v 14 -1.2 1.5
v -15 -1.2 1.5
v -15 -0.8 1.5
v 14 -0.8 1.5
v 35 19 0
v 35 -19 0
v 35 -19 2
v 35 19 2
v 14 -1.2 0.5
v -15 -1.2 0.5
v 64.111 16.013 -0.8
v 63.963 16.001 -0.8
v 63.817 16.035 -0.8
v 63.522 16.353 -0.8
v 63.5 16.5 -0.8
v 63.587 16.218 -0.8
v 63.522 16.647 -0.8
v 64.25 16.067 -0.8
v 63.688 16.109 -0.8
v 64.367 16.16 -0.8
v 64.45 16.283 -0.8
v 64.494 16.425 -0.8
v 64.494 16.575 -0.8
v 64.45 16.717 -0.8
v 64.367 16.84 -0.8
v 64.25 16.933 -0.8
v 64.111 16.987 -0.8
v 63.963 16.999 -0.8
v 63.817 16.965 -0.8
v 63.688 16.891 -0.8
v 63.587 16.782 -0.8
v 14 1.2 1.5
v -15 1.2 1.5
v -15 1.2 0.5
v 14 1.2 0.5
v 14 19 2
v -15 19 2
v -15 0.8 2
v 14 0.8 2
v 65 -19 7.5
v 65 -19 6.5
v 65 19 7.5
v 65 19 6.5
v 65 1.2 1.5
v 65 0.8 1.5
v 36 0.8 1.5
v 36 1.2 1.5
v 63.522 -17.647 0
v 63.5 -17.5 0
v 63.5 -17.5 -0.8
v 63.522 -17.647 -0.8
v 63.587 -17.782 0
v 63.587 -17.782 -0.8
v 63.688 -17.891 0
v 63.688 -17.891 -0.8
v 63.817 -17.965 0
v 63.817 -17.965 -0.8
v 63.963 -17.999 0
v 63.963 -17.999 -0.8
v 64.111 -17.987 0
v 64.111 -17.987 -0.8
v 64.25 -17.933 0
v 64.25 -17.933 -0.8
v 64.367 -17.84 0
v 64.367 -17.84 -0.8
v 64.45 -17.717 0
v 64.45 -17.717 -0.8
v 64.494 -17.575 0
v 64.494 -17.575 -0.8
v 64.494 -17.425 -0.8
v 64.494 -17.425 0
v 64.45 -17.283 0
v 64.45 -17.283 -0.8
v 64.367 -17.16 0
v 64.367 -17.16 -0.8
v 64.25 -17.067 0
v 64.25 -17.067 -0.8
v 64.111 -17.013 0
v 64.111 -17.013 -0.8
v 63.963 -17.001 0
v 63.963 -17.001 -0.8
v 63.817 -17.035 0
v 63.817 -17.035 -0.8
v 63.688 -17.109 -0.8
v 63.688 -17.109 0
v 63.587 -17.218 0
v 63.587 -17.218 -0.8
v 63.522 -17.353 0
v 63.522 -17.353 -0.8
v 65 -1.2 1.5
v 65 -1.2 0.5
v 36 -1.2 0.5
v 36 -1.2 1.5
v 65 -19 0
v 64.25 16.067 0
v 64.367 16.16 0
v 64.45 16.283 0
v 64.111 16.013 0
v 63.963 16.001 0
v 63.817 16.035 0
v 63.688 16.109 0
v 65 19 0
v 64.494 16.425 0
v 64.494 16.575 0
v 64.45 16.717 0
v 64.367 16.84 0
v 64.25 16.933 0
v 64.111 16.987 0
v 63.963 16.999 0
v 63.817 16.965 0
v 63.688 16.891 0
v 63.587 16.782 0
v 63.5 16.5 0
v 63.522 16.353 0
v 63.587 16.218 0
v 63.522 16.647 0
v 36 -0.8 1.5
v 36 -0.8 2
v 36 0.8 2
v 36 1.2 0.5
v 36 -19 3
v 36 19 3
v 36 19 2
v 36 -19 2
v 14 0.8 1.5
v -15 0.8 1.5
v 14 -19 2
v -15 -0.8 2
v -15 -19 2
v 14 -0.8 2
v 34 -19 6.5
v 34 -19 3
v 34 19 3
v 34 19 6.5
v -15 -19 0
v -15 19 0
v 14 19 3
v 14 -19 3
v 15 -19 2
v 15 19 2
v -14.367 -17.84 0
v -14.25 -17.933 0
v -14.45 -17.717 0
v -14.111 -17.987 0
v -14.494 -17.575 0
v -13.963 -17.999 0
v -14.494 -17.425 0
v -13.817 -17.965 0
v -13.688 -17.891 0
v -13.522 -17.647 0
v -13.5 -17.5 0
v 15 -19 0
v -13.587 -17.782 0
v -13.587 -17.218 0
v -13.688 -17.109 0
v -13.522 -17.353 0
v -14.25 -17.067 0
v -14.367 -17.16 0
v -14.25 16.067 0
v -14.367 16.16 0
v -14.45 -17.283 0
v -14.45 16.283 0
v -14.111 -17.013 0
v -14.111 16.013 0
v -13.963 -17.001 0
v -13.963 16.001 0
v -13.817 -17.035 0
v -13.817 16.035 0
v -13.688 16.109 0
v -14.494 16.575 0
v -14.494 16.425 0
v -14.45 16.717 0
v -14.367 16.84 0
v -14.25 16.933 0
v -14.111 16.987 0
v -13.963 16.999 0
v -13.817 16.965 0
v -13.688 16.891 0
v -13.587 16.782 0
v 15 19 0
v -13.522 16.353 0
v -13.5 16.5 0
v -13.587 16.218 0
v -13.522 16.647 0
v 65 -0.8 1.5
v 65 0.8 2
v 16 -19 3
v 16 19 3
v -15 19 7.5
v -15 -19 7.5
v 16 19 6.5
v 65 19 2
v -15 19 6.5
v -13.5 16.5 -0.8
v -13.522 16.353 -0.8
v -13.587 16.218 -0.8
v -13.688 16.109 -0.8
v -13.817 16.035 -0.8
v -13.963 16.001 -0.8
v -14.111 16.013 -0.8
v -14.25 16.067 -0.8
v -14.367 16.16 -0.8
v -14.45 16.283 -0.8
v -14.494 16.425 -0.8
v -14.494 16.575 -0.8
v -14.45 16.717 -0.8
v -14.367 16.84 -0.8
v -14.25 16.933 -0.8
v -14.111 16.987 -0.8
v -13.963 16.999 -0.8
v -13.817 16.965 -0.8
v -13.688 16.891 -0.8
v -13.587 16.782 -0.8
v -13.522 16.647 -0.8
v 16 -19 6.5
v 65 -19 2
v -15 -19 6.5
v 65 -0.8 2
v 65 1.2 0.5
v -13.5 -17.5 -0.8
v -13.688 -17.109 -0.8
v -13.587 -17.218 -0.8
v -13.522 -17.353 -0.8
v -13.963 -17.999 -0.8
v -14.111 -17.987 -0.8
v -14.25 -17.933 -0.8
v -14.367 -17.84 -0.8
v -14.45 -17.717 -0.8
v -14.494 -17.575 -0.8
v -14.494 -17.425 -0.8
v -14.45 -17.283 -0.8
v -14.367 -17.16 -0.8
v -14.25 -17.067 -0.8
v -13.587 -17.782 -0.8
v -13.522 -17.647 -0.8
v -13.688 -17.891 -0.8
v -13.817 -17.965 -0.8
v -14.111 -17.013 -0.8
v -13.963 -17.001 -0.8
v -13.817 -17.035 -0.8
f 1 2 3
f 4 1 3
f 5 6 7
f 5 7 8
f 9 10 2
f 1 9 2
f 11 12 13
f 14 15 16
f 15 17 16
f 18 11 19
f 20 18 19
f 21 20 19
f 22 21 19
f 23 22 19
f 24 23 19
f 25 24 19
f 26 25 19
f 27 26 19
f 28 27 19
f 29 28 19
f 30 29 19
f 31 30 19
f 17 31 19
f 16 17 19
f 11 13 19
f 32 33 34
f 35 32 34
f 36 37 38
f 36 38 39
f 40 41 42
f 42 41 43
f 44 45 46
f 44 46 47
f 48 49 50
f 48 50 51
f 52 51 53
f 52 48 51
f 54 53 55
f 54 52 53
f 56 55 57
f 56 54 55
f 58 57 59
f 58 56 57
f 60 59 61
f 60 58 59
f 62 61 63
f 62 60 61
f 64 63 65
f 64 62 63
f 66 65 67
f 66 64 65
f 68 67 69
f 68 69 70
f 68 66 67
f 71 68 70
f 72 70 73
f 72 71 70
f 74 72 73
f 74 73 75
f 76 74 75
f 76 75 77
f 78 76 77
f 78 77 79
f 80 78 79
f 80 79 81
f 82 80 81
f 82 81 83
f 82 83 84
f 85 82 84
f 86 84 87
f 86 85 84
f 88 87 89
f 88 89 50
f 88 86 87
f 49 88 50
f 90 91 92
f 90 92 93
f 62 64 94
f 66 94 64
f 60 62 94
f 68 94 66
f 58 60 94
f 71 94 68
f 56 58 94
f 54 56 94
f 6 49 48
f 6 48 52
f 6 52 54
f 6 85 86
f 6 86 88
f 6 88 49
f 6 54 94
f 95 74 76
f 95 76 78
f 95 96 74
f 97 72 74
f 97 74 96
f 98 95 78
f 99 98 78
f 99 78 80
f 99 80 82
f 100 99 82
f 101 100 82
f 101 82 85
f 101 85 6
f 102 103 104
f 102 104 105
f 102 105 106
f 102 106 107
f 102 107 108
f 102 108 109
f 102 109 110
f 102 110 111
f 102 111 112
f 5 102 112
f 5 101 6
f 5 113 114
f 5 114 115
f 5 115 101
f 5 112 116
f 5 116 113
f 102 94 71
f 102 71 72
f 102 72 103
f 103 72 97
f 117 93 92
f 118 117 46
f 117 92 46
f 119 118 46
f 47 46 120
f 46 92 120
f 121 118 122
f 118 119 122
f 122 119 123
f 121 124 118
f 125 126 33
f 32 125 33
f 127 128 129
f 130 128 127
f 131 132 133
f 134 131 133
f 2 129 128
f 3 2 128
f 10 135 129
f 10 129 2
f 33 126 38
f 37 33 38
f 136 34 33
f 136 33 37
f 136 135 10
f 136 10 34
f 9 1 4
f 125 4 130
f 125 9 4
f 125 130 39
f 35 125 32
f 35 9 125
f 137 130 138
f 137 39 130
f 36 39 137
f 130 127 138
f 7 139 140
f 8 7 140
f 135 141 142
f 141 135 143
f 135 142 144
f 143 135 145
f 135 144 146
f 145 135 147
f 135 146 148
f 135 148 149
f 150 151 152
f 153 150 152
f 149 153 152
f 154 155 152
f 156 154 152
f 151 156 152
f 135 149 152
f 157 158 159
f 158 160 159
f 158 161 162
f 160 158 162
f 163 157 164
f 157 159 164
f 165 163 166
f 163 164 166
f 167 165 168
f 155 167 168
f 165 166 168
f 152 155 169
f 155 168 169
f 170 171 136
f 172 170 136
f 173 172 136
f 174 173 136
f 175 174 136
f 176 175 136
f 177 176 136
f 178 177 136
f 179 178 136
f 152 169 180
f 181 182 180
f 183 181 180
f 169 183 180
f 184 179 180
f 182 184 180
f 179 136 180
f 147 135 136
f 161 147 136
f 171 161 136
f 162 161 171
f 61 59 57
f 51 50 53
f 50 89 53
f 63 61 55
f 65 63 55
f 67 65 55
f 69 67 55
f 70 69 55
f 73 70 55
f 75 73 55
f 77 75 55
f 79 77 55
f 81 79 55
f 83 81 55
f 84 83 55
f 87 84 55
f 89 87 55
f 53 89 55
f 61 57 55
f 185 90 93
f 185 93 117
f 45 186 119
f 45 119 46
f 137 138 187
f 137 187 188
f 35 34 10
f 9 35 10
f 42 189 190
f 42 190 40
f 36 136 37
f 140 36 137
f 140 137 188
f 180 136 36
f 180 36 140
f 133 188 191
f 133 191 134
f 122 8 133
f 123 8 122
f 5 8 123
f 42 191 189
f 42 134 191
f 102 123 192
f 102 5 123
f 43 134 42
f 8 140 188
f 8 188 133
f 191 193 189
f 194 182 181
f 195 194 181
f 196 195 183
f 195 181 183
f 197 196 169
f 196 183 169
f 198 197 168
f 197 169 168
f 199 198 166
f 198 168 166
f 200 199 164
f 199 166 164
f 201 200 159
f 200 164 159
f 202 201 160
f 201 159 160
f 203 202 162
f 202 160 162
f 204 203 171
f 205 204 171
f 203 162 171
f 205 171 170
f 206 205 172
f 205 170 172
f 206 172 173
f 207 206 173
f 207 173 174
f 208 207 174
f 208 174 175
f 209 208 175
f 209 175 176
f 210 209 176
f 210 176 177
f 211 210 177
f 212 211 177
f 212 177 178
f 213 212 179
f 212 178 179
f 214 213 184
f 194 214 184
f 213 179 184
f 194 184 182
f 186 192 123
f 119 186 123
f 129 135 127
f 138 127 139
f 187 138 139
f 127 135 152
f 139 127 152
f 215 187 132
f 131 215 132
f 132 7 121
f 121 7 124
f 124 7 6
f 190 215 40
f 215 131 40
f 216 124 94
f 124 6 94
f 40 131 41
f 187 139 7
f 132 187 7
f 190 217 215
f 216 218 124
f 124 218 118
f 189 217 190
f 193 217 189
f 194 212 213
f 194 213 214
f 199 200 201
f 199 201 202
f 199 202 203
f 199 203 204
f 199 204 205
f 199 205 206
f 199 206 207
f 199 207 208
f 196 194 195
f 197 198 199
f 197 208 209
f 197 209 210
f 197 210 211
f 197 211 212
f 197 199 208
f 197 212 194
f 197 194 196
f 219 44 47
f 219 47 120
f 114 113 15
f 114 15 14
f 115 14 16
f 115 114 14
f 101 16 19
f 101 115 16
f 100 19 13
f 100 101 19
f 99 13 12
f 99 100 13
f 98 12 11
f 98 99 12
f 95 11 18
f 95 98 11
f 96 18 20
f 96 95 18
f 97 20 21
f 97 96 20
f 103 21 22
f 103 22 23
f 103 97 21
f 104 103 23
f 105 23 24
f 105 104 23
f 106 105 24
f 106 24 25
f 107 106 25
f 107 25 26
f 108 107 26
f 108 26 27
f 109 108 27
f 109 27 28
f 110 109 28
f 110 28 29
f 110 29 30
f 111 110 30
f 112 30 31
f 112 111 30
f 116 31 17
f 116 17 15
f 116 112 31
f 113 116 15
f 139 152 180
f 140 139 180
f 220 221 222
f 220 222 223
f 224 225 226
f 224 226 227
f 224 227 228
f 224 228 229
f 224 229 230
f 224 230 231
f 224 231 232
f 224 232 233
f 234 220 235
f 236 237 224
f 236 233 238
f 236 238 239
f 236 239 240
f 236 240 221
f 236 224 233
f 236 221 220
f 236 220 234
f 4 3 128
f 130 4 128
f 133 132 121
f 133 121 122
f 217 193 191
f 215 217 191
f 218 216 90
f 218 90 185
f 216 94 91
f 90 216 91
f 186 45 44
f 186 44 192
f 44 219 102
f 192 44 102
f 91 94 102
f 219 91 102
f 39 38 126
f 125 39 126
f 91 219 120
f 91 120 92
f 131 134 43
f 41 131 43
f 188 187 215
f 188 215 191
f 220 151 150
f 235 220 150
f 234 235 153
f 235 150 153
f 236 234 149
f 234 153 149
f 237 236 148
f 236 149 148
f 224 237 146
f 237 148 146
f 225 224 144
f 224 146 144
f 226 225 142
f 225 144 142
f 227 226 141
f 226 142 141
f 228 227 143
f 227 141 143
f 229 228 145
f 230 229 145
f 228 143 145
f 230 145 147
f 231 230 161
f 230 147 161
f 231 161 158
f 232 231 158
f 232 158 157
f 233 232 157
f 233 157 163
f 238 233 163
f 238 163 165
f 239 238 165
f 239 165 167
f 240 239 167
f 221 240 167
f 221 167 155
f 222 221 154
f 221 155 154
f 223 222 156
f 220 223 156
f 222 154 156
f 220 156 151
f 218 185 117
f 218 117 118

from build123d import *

# Parameters (mm, degrees)
SKETCH1_W           = 30
SKETCH1_H           = 38
BOSS_EXTRUDE1_DEPTH = 2
SKETCH2_R           = 0.5
BOSS_EXTRUDE2_DEPTH = 0.8
SKETCH5_W           = 1
SKETCH5_H           = 38
BOSS_EXTRUDE4_DEPTH = 1
SKETCH6_W           = 1
SKETCH6_H           = 38
BOSS_EXTRUDE5_DEPTH = 20
SKETCH8_W           = 18
SKETCH8_H           = 38
BOSS_EXTRUDE6_DEPTH = 3.5
CUT_EXTRUDE1_DEPTH  = 29
SKETCH12_W          = 80
SKETCH12_H          = 38
BOSS_EXTRUDE7_DEPTH = 1


with BuildPart() as part:
    # Sketch1 → Boss-Extrude1 (new body)
    with BuildSketch(Plane.XY):
        Rectangle(SKETCH1_W, SKETCH1_H)
    extrude(amount=BOSS_EXTRUDE1_DEPTH)

    # Sketch2 → Boss-Extrude2 (add)
    with BuildSketch(Plane(origin=(0, 0, 0), x_dir=(-1, 0, 0), z_dir=(0, 0, -1))):
        with Locations(Location((14, 16.5, 0), (0, 0, 180))):
            Circle(SKETCH2_R)
        with Locations(Location((14, -17.5, 0), (0, 0, 180))):
            Circle(SKETCH2_R)
    extrude(amount=BOSS_EXTRUDE2_DEPTH)

    # Sketch5 → Boss-Extrude4 (add)
    with BuildSketch(Plane.XY.offset(2)):
        with Locations((14.5, 0)):
            Rectangle(SKETCH5_W, SKETCH5_H)
    extrude(amount=BOSS_EXTRUDE4_DEPTH)

    # Sketch6 → Boss-Extrude5 (add)
    with BuildSketch(Plane(origin=(15, 0, 0), x_dir=(0, 0, -1), z_dir=(1, 0, 0))):
        with Locations((-2.5, 0)):
            Rectangle(SKETCH6_W, SKETCH6_H)
    extrude(amount=BOSS_EXTRUDE5_DEPTH)

    # Mirror2: part across plane


with BuildPart() as part_1:
    add(part.part)
    add(part.part.mirror(Plane(origin=(25, 0, 0), x_dir=(0, 0, 1), z_dir=(1, 0, 0))))

    # Sketch8 → Boss-Extrude6 (add)
    with BuildSketch(Plane.XY.offset(3)):
        with Locations((25, 0)):
            Rectangle(SKETCH8_W, SKETCH8_H)
    extrude(amount=BOSS_EXTRUDE6_DEPTH)

    # Sketch9 → Cut-Extrude1 (cut)
    with BuildSketch(Plane.ZY.offset(15)):
        Polygon((2, -0.8), (2, 0.8), (1.5, 0.8), (1.5, 1.2), (0.5, 1.2), (0.5, -1.2), (1.5, -1.2), (1.5, -0.8), align=None)
    cut_extrude1 = extrude(amount=-CUT_EXTRUDE1_DEPTH, mode=Mode.SUBTRACT)

    # Mirror3: Cut-Extrude1 across plane
    add(cut_extrude1.mirror(Plane(origin=(25, 0, 0), x_dir=(0, 0, 1), z_dir=(1, 0, 0))), mode=Mode.SUBTRACT)

    # Sketch12 → Boss-Extrude7 (add)
    with BuildSketch(Plane.XY.offset(6.5)):
        with Locations((25, 0)):
            Rectangle(SKETCH12_W, SKETCH12_H)
    extrude(amount=BOSS_EXTRUDE7_DEPTH)


solid = part_1.part
